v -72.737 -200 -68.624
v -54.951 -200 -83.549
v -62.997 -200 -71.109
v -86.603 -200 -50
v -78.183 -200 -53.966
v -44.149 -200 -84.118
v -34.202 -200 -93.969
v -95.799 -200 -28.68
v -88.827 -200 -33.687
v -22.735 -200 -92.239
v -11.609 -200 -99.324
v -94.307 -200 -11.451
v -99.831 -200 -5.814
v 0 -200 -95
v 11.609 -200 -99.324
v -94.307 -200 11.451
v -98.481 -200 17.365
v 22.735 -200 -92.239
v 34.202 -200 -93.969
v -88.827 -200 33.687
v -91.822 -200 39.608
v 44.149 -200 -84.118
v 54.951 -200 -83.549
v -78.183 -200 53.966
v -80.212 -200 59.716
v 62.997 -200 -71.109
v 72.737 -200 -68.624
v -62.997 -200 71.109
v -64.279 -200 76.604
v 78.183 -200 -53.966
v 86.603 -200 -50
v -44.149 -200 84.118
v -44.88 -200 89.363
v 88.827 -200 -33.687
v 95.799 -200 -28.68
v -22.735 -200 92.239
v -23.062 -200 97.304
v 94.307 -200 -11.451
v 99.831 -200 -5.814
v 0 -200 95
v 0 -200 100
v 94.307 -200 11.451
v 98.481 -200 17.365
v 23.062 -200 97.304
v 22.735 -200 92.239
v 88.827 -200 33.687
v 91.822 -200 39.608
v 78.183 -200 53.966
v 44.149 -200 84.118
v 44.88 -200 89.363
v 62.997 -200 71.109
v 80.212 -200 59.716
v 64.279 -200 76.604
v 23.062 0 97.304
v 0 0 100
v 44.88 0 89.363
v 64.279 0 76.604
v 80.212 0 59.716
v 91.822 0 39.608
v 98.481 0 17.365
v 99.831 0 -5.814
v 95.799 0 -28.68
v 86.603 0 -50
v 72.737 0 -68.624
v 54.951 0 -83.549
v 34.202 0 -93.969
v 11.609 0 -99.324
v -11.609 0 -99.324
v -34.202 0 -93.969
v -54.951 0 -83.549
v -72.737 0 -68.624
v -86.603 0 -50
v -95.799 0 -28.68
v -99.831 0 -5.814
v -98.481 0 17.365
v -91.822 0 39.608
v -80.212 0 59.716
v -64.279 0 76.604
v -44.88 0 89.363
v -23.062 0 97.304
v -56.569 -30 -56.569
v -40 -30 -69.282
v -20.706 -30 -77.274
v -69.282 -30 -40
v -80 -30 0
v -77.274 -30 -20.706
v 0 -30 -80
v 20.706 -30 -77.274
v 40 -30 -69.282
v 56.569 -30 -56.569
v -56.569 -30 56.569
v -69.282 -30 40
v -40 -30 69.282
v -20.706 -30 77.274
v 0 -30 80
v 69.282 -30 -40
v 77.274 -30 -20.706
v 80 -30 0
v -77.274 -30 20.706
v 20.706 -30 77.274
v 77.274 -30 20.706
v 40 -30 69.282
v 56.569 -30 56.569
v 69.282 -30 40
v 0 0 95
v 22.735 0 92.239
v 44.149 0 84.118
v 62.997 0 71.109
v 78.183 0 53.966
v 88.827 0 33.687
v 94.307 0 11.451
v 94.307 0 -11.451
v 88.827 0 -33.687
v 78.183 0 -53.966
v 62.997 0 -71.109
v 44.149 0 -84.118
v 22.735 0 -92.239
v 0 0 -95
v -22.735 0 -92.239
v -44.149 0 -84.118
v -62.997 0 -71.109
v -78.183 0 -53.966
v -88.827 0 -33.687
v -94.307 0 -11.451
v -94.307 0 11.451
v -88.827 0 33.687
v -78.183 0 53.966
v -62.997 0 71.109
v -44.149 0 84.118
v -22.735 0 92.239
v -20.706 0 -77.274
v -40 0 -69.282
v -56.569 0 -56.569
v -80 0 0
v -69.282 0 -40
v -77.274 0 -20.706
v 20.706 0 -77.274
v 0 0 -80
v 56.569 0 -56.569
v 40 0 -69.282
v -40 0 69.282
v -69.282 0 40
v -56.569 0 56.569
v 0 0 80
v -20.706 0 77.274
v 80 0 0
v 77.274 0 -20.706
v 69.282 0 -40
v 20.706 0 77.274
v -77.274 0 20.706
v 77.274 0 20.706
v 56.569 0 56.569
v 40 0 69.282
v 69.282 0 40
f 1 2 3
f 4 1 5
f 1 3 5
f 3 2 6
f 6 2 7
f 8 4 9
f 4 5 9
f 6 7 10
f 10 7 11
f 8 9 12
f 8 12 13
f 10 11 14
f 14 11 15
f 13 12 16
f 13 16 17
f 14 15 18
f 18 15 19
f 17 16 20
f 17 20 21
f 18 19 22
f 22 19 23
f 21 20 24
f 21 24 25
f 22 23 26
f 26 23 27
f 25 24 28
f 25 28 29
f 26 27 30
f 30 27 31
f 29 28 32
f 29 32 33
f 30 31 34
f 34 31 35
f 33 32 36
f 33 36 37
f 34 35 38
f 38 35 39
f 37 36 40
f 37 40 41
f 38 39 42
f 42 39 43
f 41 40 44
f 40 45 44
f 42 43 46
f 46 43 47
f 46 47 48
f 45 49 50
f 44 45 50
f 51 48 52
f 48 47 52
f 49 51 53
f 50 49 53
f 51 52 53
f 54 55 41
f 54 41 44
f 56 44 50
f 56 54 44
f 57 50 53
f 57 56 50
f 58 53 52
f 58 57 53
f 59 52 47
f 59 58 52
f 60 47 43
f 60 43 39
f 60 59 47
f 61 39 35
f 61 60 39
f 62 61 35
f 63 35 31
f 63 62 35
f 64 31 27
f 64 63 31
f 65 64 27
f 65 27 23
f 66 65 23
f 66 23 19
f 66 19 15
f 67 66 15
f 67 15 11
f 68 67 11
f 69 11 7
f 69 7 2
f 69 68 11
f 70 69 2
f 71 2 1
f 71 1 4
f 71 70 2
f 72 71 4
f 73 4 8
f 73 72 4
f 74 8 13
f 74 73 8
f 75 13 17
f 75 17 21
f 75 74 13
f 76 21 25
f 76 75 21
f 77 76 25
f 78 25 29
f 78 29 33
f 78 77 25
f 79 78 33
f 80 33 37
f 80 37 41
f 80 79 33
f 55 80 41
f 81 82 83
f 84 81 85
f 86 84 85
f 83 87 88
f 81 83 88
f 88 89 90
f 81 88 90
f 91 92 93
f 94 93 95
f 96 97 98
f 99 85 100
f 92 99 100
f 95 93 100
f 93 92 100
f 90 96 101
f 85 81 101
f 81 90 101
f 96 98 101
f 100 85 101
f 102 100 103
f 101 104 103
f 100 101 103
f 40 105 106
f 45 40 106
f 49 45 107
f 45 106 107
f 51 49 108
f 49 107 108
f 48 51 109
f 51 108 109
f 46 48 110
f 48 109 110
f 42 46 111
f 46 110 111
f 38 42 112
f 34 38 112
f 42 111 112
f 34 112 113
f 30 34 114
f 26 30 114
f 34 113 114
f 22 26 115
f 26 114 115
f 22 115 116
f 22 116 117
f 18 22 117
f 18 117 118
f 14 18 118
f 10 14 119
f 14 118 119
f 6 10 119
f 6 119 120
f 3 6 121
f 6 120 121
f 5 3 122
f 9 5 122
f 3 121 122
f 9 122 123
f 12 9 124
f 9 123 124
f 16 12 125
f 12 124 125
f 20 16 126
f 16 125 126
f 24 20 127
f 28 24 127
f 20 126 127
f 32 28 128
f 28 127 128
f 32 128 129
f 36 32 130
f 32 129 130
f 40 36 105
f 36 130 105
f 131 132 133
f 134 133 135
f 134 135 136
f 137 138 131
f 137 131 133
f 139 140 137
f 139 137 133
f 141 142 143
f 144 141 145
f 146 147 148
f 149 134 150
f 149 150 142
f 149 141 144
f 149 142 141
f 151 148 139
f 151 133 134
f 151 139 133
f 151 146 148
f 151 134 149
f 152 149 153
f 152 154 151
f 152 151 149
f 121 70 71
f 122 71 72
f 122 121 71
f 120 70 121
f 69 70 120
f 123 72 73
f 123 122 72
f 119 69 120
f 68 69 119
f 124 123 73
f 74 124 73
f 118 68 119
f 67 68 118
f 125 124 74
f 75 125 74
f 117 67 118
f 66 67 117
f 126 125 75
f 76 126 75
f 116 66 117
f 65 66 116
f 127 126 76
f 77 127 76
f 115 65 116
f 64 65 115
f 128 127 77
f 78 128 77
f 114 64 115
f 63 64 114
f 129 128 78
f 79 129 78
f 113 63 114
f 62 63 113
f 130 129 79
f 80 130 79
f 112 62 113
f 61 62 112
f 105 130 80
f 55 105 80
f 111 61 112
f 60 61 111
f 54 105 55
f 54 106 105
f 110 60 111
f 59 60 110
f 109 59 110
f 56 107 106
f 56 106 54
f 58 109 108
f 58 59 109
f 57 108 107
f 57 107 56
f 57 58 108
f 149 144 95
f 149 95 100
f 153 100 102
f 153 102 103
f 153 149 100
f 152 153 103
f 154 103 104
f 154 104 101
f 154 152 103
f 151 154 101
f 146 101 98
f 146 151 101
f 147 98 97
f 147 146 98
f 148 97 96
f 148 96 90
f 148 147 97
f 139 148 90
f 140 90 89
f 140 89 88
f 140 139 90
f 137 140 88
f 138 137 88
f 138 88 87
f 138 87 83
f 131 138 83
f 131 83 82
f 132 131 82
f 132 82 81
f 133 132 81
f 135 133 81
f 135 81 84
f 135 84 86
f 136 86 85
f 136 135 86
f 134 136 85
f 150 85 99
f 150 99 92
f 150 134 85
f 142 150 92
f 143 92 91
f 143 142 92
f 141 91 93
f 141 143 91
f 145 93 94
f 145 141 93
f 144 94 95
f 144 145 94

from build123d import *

# Parameters (mm, degrees)
SKETCH_6_R      = 100
SKETCH_6_R_2    = 95
EXTRUDE_1_DEPTH = 200
SKETCH_7_R      = 80
EXTRUDE_2_DEPTH = 30


with BuildPart() as part:
    # 草图6 → 凸台-拉伸1 (new body)
    with BuildSketch(Plane(origin=(0, 0, 0), x_dir=(1, 0, 0), z_dir=(0, 1, 0))):
        with Locations(Location((0, 0, 0), (0, 0, 270))):
            Circle(SKETCH_6_R)
        with Locations(Location((0, 0, 0), (0, 0, 270))):
            Circle(SKETCH_6_R_2, mode=Mode.SUBTRACT)
    extrude(amount=-EXTRUDE_1_DEPTH)


with BuildPart() as body_2:
    # 草图7 → 凸台-拉伸2 (new body)
    with BuildSketch(Plane(origin=(0, 0, 0), x_dir=(1, 0, 0), z_dir=(0, 1, 0))):
        with Locations(Location((0, 0, 0), (0, 0, 270))):
            Circle(SKETCH_7_R)
    extrude(amount=-EXTRUDE_2_DEPTH)


solid = Compound([part.part, body_2.part])
